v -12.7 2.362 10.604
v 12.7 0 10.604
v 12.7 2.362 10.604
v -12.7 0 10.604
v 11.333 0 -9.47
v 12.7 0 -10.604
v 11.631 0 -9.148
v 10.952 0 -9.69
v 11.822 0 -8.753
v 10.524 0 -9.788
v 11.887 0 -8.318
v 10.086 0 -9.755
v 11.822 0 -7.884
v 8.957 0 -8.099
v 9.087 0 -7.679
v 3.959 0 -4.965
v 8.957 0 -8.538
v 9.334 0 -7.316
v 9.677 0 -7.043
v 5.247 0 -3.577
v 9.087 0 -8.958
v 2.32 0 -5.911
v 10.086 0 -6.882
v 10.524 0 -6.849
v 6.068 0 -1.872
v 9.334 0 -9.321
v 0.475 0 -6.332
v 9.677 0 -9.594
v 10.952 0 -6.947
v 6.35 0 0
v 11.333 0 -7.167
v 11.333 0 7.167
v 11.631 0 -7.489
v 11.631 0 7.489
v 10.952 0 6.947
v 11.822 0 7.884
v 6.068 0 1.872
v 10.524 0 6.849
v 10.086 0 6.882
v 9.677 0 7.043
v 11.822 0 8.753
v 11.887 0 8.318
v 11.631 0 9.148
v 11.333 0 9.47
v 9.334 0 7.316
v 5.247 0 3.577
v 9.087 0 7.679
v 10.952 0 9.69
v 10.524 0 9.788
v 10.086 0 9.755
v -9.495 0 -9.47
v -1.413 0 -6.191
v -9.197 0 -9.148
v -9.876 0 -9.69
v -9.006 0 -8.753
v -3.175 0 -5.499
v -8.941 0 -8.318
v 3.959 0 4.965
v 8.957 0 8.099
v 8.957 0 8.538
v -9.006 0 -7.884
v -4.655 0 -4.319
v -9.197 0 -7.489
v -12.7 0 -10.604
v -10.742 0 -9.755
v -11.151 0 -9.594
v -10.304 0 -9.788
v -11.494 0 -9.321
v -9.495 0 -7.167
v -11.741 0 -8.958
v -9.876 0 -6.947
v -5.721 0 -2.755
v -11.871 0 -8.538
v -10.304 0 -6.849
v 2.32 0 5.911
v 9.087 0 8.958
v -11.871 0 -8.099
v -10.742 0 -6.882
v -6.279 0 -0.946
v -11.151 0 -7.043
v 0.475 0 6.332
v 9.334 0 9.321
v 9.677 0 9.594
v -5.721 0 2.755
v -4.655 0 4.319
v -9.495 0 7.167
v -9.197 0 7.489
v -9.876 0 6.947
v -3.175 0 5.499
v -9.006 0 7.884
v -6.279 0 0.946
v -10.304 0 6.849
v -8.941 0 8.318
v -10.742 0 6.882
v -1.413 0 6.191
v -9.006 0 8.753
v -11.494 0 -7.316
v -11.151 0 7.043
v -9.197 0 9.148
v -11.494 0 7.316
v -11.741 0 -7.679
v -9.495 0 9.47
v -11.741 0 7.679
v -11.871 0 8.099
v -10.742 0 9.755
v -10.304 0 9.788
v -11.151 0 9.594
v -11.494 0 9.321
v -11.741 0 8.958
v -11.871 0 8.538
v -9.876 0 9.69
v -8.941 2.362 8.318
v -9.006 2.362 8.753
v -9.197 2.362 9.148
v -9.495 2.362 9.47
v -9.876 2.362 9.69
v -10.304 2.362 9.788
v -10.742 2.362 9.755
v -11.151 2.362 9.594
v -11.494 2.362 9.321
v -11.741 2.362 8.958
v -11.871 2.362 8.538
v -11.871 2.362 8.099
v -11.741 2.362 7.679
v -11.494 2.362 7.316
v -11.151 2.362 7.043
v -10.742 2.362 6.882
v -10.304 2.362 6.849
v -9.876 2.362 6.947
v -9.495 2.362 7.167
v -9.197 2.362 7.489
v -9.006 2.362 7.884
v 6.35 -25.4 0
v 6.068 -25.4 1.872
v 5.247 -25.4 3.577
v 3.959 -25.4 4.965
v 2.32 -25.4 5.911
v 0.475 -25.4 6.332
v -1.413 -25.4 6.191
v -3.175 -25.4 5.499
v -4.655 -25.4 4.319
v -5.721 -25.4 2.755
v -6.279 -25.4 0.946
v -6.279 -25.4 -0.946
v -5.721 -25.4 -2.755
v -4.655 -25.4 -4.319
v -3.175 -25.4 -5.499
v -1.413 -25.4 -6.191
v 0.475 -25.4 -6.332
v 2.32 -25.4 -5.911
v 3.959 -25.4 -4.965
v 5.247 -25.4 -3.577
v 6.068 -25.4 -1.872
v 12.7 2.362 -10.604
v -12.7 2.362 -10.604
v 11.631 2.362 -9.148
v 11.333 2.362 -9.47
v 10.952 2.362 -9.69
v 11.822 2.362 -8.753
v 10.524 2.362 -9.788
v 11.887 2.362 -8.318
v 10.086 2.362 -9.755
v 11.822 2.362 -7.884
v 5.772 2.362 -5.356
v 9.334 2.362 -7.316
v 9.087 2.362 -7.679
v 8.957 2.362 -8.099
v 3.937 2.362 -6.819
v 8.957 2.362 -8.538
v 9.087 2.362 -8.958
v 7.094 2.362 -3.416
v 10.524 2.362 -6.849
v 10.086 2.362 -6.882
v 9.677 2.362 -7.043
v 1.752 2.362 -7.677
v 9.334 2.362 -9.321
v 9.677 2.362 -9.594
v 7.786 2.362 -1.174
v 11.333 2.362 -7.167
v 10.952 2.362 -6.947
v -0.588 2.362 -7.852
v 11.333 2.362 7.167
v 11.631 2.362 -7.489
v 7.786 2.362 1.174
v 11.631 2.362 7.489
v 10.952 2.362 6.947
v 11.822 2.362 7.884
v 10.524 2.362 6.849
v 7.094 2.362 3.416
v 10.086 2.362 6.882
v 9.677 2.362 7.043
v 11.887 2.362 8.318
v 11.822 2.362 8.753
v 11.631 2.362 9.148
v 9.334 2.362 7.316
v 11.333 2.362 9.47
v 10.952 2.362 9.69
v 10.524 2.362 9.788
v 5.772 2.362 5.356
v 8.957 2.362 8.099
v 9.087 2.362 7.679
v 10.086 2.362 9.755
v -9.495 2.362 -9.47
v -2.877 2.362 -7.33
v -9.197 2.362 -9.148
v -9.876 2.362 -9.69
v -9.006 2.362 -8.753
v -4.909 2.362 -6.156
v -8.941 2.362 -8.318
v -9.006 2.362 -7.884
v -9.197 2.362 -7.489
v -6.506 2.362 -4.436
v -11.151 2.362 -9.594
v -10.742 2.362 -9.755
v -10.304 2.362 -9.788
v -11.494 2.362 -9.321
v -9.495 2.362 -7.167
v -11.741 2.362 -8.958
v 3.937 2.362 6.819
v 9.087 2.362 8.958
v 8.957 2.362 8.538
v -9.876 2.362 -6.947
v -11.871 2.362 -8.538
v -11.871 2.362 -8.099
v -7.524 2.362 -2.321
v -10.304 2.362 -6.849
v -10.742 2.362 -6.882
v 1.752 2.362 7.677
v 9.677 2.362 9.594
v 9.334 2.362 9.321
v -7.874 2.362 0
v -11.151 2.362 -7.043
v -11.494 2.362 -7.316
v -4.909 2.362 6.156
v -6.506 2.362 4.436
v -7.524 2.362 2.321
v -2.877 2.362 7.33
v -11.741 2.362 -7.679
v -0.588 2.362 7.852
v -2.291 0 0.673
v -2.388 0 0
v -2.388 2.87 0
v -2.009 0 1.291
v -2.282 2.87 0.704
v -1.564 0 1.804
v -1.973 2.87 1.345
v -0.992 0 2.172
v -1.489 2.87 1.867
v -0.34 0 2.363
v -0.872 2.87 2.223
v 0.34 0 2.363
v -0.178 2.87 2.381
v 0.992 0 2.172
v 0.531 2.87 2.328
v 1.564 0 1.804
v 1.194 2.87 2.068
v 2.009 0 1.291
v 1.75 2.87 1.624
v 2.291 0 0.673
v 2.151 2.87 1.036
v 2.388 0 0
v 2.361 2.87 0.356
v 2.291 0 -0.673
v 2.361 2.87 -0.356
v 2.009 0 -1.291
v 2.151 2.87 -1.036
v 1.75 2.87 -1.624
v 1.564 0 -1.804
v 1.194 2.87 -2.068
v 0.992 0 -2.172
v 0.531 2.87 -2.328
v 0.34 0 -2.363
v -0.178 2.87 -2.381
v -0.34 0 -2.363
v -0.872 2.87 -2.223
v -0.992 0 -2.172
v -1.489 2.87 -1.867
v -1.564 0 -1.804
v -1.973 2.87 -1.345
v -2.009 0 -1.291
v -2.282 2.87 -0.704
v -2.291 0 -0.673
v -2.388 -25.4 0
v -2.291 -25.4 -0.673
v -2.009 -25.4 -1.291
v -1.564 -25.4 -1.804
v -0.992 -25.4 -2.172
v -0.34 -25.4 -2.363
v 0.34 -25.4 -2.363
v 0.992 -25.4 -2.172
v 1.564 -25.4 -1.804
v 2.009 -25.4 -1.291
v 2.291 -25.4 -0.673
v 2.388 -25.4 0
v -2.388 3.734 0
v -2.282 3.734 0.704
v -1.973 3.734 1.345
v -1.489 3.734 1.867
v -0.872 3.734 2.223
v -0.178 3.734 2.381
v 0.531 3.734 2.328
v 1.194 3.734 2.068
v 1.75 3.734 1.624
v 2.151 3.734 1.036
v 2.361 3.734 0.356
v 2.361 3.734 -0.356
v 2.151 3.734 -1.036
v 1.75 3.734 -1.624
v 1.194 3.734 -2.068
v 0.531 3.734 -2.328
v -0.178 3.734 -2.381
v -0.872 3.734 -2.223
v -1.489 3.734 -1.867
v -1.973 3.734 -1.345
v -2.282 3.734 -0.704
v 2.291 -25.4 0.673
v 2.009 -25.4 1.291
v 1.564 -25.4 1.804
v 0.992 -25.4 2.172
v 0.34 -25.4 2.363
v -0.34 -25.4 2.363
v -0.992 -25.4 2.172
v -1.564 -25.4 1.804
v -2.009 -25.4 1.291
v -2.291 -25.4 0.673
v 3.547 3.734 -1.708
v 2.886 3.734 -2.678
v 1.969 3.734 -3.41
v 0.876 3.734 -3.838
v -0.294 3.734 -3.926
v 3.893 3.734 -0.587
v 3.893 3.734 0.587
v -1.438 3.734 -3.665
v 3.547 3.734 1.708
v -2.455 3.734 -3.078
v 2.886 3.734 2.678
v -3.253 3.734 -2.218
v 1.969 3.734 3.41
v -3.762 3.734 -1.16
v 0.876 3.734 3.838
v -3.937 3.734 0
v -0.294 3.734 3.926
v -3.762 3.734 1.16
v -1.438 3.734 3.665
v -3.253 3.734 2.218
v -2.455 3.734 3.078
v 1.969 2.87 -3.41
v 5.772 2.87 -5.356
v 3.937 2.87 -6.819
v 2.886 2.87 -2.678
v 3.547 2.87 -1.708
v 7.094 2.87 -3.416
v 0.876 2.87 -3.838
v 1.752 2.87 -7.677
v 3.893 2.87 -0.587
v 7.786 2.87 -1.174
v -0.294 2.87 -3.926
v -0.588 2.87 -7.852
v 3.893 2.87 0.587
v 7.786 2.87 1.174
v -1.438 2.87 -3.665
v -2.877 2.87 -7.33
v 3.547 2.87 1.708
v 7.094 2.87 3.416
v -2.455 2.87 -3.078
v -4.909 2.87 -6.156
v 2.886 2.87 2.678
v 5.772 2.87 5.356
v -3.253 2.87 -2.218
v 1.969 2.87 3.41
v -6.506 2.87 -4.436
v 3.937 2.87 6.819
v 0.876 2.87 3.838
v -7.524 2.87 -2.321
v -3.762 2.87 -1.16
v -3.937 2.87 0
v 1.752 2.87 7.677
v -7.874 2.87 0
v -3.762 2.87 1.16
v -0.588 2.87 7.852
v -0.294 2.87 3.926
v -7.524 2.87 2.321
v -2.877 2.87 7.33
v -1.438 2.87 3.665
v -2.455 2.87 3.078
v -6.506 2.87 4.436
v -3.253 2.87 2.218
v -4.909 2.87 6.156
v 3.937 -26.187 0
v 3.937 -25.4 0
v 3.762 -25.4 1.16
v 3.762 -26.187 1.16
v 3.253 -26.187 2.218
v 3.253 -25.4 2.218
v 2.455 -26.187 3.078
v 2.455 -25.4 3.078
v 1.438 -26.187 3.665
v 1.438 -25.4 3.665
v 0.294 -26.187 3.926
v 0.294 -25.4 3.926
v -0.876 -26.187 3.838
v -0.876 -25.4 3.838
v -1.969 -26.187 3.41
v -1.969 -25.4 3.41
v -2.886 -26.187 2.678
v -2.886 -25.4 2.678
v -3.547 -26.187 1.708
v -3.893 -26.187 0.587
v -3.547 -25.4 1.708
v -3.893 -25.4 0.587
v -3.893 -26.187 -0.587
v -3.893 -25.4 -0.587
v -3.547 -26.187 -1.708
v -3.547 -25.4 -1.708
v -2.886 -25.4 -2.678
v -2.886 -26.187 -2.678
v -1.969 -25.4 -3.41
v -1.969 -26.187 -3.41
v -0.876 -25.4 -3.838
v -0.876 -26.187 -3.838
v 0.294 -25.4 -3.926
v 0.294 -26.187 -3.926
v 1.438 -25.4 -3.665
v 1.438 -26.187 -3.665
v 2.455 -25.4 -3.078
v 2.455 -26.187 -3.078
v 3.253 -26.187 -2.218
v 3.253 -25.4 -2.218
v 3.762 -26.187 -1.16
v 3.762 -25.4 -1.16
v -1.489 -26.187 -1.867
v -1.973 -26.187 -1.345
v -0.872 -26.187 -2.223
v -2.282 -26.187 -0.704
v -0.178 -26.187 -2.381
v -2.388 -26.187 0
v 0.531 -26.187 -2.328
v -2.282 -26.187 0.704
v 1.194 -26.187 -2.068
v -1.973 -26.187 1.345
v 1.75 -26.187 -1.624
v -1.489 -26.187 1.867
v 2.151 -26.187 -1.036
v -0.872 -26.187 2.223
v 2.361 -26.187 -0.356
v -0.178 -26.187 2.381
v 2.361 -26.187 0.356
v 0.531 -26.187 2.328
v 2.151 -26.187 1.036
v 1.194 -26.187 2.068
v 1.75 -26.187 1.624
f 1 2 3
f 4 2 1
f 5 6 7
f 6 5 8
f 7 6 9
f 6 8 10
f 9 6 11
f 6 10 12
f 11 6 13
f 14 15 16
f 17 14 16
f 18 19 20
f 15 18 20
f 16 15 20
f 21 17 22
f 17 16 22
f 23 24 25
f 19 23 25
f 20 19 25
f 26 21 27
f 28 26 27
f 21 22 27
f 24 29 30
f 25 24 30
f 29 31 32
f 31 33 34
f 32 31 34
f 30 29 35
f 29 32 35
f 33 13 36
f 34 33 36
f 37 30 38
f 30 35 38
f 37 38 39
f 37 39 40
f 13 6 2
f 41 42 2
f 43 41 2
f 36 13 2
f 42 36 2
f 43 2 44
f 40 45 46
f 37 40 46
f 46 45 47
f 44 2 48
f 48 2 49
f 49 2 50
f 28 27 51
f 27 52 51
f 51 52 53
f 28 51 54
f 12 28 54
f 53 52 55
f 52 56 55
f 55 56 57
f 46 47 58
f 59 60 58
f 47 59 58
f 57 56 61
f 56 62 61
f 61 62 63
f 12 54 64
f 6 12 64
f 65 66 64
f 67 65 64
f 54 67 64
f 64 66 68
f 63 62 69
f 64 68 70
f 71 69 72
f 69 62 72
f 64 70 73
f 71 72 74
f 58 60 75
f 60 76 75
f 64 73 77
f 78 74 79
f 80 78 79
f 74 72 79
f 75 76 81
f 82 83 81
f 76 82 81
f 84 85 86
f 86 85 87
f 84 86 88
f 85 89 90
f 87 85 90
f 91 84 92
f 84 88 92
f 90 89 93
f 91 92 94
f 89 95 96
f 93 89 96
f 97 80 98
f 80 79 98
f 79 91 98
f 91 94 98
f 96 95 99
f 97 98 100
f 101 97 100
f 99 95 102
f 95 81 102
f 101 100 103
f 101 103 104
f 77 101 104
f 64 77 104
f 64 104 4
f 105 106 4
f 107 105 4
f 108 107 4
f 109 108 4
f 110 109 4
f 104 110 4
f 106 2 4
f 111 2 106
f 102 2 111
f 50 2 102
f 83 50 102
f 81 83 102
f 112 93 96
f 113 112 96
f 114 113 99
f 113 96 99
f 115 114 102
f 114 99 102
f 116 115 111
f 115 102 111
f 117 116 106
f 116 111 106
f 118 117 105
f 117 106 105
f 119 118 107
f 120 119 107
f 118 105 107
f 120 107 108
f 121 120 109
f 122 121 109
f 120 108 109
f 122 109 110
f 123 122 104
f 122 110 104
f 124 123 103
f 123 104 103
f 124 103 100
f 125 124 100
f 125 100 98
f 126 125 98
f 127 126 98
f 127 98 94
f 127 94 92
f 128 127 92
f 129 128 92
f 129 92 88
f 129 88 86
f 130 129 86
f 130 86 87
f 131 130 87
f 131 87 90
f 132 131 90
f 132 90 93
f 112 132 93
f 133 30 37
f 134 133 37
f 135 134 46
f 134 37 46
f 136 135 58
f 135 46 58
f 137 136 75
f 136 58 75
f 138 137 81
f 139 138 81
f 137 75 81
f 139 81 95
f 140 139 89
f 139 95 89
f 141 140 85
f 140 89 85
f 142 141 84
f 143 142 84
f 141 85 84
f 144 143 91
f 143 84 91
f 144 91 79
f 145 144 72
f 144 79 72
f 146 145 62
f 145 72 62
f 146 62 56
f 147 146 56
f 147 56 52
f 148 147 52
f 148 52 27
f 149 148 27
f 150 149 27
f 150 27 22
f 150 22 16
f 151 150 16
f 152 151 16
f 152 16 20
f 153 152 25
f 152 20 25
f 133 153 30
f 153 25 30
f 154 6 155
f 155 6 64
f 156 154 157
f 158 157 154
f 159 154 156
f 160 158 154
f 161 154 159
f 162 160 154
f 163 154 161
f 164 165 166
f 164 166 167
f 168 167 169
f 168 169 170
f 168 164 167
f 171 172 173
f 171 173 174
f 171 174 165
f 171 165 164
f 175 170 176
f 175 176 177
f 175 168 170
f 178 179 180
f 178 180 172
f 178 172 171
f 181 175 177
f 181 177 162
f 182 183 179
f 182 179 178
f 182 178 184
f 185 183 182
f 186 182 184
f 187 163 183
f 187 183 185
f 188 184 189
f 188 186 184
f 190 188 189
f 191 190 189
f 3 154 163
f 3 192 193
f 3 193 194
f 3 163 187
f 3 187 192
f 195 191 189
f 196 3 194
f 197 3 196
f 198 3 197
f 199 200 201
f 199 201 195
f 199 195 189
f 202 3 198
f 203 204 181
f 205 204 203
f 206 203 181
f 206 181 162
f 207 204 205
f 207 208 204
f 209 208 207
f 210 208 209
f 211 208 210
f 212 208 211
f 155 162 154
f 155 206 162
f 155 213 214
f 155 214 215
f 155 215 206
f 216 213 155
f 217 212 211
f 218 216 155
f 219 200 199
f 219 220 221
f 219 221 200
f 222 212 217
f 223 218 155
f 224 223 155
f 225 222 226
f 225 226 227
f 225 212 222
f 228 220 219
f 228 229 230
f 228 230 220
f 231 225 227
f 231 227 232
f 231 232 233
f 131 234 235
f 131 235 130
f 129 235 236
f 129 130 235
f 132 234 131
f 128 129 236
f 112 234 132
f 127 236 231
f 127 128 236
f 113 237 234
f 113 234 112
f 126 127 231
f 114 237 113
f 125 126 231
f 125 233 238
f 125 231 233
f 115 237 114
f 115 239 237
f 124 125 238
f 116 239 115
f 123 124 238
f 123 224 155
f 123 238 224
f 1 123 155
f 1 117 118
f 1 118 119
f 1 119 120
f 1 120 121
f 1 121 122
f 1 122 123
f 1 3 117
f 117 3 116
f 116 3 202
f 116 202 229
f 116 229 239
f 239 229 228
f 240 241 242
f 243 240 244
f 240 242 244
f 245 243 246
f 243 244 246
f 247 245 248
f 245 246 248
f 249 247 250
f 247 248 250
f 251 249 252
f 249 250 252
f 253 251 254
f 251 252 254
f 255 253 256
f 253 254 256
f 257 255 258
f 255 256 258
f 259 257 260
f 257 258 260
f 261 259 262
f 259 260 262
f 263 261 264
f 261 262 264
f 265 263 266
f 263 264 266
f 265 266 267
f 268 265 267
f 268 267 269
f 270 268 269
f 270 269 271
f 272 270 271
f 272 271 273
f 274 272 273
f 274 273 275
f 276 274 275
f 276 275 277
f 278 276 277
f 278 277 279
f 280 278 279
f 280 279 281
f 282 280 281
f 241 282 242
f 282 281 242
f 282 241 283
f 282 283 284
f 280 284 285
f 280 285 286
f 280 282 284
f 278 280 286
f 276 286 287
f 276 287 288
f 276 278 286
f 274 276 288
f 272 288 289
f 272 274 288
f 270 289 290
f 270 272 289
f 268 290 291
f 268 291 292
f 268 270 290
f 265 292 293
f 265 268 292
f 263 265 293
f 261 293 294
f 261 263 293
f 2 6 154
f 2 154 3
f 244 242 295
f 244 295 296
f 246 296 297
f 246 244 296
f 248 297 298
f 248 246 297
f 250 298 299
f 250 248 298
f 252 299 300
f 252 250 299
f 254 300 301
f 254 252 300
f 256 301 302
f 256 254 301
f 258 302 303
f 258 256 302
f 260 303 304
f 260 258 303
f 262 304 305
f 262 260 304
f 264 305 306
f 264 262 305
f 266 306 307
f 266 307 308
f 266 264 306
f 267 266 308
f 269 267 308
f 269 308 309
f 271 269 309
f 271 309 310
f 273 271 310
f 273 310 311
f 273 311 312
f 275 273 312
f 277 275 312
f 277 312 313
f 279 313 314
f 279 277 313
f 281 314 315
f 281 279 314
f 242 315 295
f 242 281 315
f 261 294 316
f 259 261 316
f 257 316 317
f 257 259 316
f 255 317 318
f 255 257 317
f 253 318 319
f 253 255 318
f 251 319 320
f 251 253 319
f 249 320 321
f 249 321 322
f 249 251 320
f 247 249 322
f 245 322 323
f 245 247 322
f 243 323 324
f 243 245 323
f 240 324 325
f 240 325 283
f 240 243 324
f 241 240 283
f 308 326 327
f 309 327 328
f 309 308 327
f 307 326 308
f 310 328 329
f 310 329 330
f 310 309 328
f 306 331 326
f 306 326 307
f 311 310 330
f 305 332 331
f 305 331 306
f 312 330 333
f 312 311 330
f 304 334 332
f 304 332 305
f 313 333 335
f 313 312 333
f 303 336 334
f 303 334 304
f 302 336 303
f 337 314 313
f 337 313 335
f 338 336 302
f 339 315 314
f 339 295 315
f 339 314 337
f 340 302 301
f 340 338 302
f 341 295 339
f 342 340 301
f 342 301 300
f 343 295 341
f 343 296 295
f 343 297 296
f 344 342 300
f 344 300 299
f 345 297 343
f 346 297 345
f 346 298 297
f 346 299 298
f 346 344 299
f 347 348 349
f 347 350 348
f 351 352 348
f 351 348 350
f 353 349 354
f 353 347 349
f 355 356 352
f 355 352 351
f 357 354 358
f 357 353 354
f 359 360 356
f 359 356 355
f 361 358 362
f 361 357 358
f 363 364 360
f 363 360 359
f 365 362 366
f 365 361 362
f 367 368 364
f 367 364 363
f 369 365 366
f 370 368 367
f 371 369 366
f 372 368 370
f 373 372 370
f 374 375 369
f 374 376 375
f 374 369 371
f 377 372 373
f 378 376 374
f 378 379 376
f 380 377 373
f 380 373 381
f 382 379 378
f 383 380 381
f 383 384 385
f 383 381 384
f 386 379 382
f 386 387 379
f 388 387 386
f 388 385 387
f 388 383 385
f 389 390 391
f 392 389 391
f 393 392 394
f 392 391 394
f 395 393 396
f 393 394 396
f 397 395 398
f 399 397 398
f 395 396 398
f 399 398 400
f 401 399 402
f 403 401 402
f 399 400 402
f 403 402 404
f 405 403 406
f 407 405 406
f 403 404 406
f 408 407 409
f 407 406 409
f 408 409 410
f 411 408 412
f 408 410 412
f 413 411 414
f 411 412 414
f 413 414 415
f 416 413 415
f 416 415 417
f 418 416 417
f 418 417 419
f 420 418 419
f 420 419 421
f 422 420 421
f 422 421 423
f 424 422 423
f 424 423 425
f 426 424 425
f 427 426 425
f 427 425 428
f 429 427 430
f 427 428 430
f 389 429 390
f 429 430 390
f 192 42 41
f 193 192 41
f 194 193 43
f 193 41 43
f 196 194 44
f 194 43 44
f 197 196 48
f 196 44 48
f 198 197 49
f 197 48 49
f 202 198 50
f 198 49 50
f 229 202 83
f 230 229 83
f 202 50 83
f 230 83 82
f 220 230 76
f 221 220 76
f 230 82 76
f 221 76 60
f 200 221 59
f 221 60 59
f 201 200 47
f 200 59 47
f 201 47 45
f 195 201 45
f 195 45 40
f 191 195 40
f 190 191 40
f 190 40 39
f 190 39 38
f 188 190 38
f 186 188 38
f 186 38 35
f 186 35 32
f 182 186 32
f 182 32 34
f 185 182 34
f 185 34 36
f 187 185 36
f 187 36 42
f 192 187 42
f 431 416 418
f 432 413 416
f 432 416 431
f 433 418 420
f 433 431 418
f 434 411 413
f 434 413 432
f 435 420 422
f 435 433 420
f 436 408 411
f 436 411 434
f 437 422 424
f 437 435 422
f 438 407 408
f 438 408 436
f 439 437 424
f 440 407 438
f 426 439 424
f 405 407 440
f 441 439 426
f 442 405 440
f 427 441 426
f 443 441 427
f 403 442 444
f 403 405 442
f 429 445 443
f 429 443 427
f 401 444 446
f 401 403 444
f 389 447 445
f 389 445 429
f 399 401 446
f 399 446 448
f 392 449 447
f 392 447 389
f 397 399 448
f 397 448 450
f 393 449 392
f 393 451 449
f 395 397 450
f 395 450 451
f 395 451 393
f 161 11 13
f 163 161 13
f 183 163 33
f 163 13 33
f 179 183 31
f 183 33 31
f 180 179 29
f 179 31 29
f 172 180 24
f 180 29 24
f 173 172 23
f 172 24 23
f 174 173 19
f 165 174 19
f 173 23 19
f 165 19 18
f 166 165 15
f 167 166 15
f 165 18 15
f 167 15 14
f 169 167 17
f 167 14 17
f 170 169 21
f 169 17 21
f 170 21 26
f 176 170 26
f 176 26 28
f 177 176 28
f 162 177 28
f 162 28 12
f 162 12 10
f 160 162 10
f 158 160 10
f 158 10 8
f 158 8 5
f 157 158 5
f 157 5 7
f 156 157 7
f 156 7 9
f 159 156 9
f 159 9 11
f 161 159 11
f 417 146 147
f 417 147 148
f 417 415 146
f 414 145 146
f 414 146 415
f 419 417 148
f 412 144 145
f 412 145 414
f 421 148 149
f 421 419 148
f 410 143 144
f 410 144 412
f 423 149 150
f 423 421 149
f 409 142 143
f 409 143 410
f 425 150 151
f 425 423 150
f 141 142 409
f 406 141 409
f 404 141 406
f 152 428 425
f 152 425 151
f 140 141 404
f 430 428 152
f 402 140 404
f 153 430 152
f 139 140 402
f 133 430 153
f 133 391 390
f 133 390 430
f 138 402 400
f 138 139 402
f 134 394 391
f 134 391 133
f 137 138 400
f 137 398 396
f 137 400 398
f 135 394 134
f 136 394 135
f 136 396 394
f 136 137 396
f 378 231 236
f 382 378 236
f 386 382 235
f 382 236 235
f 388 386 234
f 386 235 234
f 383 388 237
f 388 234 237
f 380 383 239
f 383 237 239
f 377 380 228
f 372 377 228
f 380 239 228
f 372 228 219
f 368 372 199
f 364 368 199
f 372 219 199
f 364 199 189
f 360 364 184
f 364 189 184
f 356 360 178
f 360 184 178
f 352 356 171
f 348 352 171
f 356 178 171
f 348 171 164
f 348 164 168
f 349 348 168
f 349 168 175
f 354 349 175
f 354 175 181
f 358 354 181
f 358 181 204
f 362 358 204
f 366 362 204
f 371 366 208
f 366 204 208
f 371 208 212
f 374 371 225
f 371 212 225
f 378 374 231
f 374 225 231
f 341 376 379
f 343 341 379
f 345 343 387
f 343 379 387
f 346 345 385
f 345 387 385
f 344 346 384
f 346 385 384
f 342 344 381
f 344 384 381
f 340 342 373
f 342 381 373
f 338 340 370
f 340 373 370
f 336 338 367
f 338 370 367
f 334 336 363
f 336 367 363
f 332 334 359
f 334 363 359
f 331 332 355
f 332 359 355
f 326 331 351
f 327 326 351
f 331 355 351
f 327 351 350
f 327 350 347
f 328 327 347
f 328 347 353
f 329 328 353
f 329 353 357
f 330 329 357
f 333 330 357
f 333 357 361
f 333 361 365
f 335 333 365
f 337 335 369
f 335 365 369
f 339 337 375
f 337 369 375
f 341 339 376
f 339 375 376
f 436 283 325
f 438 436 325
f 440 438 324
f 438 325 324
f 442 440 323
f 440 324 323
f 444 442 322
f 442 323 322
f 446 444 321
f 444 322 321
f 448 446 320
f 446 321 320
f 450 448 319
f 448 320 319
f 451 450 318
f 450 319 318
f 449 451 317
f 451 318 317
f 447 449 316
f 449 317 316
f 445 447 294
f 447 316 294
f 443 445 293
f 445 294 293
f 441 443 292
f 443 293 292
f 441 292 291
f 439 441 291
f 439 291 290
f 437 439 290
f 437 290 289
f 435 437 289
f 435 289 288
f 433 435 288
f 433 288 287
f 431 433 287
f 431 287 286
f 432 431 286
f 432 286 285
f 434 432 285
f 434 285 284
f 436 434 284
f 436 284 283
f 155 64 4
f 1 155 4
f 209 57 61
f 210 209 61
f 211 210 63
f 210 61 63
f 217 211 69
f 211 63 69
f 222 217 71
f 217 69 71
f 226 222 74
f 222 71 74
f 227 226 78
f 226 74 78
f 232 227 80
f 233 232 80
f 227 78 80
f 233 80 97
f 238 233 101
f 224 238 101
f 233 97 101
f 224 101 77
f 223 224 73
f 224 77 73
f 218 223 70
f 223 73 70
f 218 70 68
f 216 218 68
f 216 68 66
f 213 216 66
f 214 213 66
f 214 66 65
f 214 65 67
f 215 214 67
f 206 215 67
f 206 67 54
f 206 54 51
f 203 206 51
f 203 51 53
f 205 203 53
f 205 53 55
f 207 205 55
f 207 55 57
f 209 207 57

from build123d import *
from build123d import SkipClean  # not in build123d's __all__

# Parameters (mm, degrees)
F0_R      = 6.35
F0_R_2    = 2.3876
F1_DEPTH  = 25.4
F2_W      = 25.4
F2_H      = 21.209
F3_DEPTH  = 2.3622
F4_R      = 7.874
F5_DEPTH  = 0.508
F6_R      = 2.3876
F7_DEPTH  = 28.2712
F8_R      = 3.937
F8_R_2    = 2.3876
F9_DEPTH  = 0.8636
F10_R     = 3.937
F11_DEPTH = 0.7874
F12_R     = 1.4732
F13_DEPTH = 3.7348


# Not quite as in the source:
# - after a boolean that leaves OpenCascade's solid faulty, fix() repairs it


with BuildPart() as f1:
    # F0 (on Front) → F1 (new body)
    with BuildSketch(Plane.XZ):
        Circle(F0_R)
        Circle(F0_R_2, mode=Mode.SUBTRACT)
    extrude(amount=F1_DEPTH)

    # F2 (on face) → F3 (join)
    with BuildSketch(Plane(origin=(0, 0, 0), x_dir=(-1, 0, 0), z_dir=(0, 1, 0))):
        Rectangle(F2_W, F2_H)
    extrude(amount=F3_DEPTH)

    # F4 (on face) → F5 (join)
    with BuildSketch(Plane(origin=(0, 2.3622, 0), x_dir=(-1, 0, 0), z_dir=(0, 1, 0))):
        Circle(F4_R)
    extrude(amount=F5_DEPTH)

    # F6 (on face) → F7 (cut, through all)
    with BuildSketch(Plane(origin=(0, 2.8702, 0), x_dir=(-1, 0, 0), z_dir=(0, 1, 0))):
        Circle(F6_R)
    with SkipClean():  # cleaning this boolean's faces spoils the solid; the shape is the same uncleaned
        extrude(amount=-F7_DEPTH, mode=Mode.SUBTRACT)

    # F8 (on face) → F9 (join)
    with BuildSketch(Plane(origin=(0, 2.8702, 0), x_dir=(-1, 0, 0), z_dir=(0, 1, 0))):
        Circle(F8_R)
        Circle(F8_R_2, mode=Mode.SUBTRACT)
    extrude(amount=F9_DEPTH)

    add(f1.part.fix(), mode=Mode.REPLACE)

    # F10 (on face) → F11 (join)
    with BuildSketch(Plane.XZ.offset(25.4)):
        Circle(F10_R)
        with BuildLine():
            ThreePointArc((2.3876, 0), (0, -2.3876), (-2.3876, 0))
            ThreePointArc((-2.3876, 0), (0, 2.3876), (2.3876, 0))
        make_face(mode=Mode.SUBTRACT)
    extrude(amount=F11_DEPTH)

    # F12 (on face) → F13 (cut, through all)
    with BuildSketch(Plane.XZ):
        with Locations((-10.414, 8.3185)):
            Circle(F12_R)
        with Locations((10.414, 8.3185)):
            Circle(F12_R)
        with Locations((-10.414, -8.3185)):
            Circle(F12_R)
        with Locations((10.414, -8.3185)):
            Circle(F12_R)
    extrude(amount=-F13_DEPTH, mode=Mode.SUBTRACT)


solid = f1.part
